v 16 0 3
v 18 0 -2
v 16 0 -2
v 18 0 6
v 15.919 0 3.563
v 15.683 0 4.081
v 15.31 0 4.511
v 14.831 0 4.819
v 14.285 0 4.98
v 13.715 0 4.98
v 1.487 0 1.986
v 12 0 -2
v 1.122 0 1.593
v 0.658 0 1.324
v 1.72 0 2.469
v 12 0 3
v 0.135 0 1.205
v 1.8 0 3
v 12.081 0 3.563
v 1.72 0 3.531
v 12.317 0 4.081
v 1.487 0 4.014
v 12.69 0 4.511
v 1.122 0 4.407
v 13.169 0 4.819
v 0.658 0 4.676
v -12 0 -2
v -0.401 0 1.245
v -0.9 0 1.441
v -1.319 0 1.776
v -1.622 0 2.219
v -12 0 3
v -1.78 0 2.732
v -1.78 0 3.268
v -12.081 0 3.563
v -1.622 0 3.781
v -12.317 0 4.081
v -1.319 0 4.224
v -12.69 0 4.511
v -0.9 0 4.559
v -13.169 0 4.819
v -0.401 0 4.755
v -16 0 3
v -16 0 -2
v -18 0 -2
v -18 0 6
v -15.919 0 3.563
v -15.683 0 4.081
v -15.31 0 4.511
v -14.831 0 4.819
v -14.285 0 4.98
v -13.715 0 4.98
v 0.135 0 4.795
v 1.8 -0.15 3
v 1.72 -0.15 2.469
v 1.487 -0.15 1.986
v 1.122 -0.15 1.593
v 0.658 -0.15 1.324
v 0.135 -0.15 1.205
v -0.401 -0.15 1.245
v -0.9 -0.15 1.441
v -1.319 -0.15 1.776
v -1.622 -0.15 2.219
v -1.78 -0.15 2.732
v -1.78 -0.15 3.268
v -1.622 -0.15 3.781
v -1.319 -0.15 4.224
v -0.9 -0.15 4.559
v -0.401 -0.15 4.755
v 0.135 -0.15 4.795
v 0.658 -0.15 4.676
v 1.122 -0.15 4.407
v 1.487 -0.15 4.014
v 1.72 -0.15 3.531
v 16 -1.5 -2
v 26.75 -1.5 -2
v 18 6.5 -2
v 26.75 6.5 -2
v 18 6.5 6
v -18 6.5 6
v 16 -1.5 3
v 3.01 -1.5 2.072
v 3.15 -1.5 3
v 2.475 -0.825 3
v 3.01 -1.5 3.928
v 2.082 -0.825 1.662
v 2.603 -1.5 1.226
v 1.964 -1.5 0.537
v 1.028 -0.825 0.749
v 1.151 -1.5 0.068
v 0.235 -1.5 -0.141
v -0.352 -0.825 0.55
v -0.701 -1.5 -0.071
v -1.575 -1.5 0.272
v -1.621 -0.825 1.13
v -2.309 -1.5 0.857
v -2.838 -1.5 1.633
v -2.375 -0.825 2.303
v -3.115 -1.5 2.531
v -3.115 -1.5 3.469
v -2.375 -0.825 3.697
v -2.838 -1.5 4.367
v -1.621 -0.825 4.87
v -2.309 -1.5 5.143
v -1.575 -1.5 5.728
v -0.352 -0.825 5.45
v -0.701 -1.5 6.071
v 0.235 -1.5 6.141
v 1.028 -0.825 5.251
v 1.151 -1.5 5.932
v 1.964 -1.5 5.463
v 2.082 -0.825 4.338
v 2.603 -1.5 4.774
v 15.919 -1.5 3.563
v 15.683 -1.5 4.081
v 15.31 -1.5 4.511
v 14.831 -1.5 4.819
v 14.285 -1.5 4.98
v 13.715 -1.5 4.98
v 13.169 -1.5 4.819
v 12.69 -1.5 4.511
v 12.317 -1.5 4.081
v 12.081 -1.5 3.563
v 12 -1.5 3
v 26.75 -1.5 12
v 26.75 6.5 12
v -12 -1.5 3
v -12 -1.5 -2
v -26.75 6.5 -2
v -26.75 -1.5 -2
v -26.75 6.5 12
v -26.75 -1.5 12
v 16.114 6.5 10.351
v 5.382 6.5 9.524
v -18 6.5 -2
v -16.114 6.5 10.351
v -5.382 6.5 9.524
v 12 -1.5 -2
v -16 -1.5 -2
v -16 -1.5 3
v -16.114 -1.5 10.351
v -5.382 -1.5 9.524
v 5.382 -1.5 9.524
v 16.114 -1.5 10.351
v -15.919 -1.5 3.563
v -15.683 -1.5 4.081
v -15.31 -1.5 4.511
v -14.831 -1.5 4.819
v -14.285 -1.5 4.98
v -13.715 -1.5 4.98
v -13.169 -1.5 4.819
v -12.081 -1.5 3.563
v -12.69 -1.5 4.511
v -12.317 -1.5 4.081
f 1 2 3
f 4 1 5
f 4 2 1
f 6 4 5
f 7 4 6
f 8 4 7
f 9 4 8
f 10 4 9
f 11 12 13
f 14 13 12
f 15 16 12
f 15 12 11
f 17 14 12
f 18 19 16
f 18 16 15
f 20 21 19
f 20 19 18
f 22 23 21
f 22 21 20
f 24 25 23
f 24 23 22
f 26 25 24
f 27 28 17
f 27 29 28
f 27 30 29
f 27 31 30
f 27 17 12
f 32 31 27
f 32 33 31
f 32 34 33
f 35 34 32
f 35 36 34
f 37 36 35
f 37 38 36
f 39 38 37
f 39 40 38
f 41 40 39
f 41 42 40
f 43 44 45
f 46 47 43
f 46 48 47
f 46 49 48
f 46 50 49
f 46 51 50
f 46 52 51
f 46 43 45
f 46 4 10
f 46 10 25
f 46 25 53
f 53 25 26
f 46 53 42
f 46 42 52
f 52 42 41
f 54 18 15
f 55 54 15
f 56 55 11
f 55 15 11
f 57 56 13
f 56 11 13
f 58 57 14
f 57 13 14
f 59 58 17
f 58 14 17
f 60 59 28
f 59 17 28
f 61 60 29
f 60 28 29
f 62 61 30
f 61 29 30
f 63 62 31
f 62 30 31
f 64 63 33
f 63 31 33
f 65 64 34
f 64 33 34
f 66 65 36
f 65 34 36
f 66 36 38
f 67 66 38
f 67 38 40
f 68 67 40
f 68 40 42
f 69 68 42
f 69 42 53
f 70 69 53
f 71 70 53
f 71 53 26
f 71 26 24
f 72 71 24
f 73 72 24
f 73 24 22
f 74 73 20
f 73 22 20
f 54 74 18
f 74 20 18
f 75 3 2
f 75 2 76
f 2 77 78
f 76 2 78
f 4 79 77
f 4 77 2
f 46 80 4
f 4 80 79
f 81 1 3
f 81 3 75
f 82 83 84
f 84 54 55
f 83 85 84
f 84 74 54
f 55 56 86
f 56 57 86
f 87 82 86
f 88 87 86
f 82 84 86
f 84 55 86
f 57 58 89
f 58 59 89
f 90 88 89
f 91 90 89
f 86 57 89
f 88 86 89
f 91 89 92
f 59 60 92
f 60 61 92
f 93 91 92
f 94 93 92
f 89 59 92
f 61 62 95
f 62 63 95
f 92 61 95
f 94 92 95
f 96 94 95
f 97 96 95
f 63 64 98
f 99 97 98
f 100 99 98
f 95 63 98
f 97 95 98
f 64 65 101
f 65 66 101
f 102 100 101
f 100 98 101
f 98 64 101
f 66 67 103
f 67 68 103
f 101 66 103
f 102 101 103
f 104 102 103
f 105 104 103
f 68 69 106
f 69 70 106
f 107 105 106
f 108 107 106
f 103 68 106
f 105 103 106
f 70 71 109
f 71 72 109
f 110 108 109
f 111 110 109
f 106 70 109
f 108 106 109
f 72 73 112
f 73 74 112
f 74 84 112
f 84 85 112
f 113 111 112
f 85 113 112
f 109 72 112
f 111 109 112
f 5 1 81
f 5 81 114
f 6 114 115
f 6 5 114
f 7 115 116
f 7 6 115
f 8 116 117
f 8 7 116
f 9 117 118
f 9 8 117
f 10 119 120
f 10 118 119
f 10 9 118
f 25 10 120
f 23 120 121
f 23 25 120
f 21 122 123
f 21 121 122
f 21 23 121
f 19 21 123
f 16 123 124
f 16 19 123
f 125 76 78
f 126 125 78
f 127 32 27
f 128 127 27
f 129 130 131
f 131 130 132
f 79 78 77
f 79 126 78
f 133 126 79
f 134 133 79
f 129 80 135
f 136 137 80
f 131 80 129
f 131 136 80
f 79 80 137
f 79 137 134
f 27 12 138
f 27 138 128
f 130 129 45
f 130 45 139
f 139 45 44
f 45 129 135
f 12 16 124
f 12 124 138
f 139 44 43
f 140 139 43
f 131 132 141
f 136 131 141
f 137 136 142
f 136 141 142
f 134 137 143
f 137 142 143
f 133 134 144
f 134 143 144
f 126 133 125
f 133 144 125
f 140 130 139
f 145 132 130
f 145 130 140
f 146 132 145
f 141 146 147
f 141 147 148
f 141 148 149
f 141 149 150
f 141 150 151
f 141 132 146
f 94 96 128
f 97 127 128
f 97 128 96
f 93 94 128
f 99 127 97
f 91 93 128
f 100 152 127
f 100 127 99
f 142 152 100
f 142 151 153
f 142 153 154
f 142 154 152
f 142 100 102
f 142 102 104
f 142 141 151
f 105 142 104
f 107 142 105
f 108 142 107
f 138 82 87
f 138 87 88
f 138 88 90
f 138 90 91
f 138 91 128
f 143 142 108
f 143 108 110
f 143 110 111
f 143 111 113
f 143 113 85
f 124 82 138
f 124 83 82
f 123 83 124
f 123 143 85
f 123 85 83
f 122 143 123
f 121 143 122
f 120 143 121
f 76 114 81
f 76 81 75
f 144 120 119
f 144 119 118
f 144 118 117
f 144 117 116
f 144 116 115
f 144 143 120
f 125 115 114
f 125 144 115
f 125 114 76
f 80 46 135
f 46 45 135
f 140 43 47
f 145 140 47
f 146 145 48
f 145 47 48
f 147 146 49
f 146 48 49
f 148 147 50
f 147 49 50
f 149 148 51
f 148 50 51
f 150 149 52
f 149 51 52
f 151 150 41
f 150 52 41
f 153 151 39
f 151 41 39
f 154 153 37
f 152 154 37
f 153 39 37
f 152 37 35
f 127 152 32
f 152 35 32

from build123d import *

# Parameters (mm, degrees)
BOSS_EXTRUDE1_DEPTH                                 = 6
SKETCH3_W                                           = 53.5
SKETCH3_H                                           = 8
BOSS_EXTRUDE2_DEPTH                                 = 2
CSK_FOR_M3_COUNTERSUNK_FLAT_HEAD_SCREW1_D           = 3.6
CSK_FOR_M3_COUNTERSUNK_FLAT_HEAD_SCREW1_CSINK_D     = 6.3
CSK_FOR_M3_COUNTERSUNK_FLAT_HEAD_SCREW1_CSINK_ANGLE = 90
CUT_EXTRUDE1_DEPTH                                  = 29.66727228
BOSS_EXTRUDE3_DEPTH                                 = 8
SKETCH8_W                                           = 24
SKETCH8_H                                           = 1.5
BOSS_EXTRUDE4_DEPTH                                 = 2
CSK_FOR_M3_COUNTERSUNK_FLAT_HEAD_SCREW2_D           = 3.6
CSK_FOR_M3_COUNTERSUNK_FLAT_HEAD_SCREW2_CSINK_D     = 6.3
CSK_FOR_M3_COUNTERSUNK_FLAT_HEAD_SCREW2_CSINK_ANGLE = 90


with BuildPart() as part:
    # Sketch1 → Boss-Extrude1 (new body)
    with BuildSketch(Plane.XY):
        Polygon((-18, 0), (-18, 6.5), (-26.75, 6.5), (-26.75, -1.5), (26.75, -1.5), (26.75, 6.5), (18, 6.5), (18, 0), align=None)
    extrude(amount=BOSS_EXTRUDE1_DEPTH)

    # Sketch3 → Boss-Extrude2 (add)
    with BuildSketch(Plane.XY.offset(6)):
        with Locations((0, 2.5)):
            Rectangle(SKETCH3_W, SKETCH3_H)
    extrude(amount=BOSS_EXTRUDE2_DEPTH)

    # CSK for M3 Countersunk Flat Head Screw1 (through all)
    with Locations(Plane(origin=(0, -1.5, 0), x_dir=(-1, 0, 0), z_dir=(0, -1, 0))):
        with Locations((0, -3)):
            CounterSinkHole(CSK_FOR_M3_COUNTERSUNK_FLAT_HEAD_SCREW1_D / 2, CSK_FOR_M3_COUNTERSUNK_FLAT_HEAD_SCREW1_CSINK_D / 2, counter_sink_angle=CSK_FOR_M3_COUNTERSUNK_FLAT_HEAD_SCREW1_CSINK_ANGLE)

    # Sketch6 → Cut-Extrude1 (cut, through all)
    with BuildSketch(Plane(origin=(0, 0, 0), x_dir=(1, 0, 0), z_dir=(0, 1, 0))):
        with BuildLine():
            Line((16, 0), (16, -3))
            ThreePointArc((16, -3), (14, -5), (12, -3))
            Line((12, -3), (12, 0))
            ThreePointArc((12, 0), (14, 2), (16, 0))
        make_face()
        with BuildLine():
            Line((-16, 0), (-16, -3))
            ThreePointArc((-16, -3), (-14, -5), (-12, -3))
            Line((-12, -3), (-12, 0))
            ThreePointArc((-12, 0), (-14, 2), (-16, 0))
        make_face()
    extrude(amount=-CUT_EXTRUDE1_DEPTH, mode=Mode.SUBTRACT)

    # Sketch7 → Boss-Extrude3 (add, through all)
    with BuildSketch(Plane(origin=(0, -1.5, 0), x_dir=(1, 0, 0), z_dir=(0, 1, 0))):
        with BuildLine():
            Line((26.75, -12), (26.75, -8))
            Line((26.75, -8), (-26.75, -8))
            Line((-26.75, -8), (-26.75, -12))
            ThreePointArc((-26.75, -12), (0, -9.420658927), (26.75, -12))
        make_face()
    extrude(amount=BOSS_EXTRUDE3_DEPTH)

    # Sketch8 → Boss-Extrude4 (add)
    with BuildSketch(Plane(origin=(0, 0, 0), x_dir=(-1, 0, 0), z_dir=(0, 0, -1))):
        Polygon((-26.75, 6.5), (-18, 6.5), (-18, 0), (-16, 0), (-16, -1.5), (-26.75, -1.5), align=None)
        with Locations((0, -0.75)):
            Rectangle(SKETCH8_W, SKETCH8_H)
        Polygon((18, 6.5), (26.75, 6.5), (26.75, -1.5), (16, -1.5), (16, 0), (18, 0), align=None)
    extrude(amount=BOSS_EXTRUDE4_DEPTH)

    # CSK for M3 Countersunk Flat Head Screw2 (through all)
    with Locations(Plane(origin=(0, -1.5, 0), x_dir=(-1, 0, 0), z_dir=(0, -1, 0))):
        with Locations((0, -3)):
            CounterSinkHole(CSK_FOR_M3_COUNTERSUNK_FLAT_HEAD_SCREW2_D / 2, CSK_FOR_M3_COUNTERSUNK_FLAT_HEAD_SCREW2_CSINK_D / 2, counter_sink_angle=CSK_FOR_M3_COUNTERSUNK_FLAT_HEAD_SCREW2_CSINK_ANGLE)


solid = part.part
